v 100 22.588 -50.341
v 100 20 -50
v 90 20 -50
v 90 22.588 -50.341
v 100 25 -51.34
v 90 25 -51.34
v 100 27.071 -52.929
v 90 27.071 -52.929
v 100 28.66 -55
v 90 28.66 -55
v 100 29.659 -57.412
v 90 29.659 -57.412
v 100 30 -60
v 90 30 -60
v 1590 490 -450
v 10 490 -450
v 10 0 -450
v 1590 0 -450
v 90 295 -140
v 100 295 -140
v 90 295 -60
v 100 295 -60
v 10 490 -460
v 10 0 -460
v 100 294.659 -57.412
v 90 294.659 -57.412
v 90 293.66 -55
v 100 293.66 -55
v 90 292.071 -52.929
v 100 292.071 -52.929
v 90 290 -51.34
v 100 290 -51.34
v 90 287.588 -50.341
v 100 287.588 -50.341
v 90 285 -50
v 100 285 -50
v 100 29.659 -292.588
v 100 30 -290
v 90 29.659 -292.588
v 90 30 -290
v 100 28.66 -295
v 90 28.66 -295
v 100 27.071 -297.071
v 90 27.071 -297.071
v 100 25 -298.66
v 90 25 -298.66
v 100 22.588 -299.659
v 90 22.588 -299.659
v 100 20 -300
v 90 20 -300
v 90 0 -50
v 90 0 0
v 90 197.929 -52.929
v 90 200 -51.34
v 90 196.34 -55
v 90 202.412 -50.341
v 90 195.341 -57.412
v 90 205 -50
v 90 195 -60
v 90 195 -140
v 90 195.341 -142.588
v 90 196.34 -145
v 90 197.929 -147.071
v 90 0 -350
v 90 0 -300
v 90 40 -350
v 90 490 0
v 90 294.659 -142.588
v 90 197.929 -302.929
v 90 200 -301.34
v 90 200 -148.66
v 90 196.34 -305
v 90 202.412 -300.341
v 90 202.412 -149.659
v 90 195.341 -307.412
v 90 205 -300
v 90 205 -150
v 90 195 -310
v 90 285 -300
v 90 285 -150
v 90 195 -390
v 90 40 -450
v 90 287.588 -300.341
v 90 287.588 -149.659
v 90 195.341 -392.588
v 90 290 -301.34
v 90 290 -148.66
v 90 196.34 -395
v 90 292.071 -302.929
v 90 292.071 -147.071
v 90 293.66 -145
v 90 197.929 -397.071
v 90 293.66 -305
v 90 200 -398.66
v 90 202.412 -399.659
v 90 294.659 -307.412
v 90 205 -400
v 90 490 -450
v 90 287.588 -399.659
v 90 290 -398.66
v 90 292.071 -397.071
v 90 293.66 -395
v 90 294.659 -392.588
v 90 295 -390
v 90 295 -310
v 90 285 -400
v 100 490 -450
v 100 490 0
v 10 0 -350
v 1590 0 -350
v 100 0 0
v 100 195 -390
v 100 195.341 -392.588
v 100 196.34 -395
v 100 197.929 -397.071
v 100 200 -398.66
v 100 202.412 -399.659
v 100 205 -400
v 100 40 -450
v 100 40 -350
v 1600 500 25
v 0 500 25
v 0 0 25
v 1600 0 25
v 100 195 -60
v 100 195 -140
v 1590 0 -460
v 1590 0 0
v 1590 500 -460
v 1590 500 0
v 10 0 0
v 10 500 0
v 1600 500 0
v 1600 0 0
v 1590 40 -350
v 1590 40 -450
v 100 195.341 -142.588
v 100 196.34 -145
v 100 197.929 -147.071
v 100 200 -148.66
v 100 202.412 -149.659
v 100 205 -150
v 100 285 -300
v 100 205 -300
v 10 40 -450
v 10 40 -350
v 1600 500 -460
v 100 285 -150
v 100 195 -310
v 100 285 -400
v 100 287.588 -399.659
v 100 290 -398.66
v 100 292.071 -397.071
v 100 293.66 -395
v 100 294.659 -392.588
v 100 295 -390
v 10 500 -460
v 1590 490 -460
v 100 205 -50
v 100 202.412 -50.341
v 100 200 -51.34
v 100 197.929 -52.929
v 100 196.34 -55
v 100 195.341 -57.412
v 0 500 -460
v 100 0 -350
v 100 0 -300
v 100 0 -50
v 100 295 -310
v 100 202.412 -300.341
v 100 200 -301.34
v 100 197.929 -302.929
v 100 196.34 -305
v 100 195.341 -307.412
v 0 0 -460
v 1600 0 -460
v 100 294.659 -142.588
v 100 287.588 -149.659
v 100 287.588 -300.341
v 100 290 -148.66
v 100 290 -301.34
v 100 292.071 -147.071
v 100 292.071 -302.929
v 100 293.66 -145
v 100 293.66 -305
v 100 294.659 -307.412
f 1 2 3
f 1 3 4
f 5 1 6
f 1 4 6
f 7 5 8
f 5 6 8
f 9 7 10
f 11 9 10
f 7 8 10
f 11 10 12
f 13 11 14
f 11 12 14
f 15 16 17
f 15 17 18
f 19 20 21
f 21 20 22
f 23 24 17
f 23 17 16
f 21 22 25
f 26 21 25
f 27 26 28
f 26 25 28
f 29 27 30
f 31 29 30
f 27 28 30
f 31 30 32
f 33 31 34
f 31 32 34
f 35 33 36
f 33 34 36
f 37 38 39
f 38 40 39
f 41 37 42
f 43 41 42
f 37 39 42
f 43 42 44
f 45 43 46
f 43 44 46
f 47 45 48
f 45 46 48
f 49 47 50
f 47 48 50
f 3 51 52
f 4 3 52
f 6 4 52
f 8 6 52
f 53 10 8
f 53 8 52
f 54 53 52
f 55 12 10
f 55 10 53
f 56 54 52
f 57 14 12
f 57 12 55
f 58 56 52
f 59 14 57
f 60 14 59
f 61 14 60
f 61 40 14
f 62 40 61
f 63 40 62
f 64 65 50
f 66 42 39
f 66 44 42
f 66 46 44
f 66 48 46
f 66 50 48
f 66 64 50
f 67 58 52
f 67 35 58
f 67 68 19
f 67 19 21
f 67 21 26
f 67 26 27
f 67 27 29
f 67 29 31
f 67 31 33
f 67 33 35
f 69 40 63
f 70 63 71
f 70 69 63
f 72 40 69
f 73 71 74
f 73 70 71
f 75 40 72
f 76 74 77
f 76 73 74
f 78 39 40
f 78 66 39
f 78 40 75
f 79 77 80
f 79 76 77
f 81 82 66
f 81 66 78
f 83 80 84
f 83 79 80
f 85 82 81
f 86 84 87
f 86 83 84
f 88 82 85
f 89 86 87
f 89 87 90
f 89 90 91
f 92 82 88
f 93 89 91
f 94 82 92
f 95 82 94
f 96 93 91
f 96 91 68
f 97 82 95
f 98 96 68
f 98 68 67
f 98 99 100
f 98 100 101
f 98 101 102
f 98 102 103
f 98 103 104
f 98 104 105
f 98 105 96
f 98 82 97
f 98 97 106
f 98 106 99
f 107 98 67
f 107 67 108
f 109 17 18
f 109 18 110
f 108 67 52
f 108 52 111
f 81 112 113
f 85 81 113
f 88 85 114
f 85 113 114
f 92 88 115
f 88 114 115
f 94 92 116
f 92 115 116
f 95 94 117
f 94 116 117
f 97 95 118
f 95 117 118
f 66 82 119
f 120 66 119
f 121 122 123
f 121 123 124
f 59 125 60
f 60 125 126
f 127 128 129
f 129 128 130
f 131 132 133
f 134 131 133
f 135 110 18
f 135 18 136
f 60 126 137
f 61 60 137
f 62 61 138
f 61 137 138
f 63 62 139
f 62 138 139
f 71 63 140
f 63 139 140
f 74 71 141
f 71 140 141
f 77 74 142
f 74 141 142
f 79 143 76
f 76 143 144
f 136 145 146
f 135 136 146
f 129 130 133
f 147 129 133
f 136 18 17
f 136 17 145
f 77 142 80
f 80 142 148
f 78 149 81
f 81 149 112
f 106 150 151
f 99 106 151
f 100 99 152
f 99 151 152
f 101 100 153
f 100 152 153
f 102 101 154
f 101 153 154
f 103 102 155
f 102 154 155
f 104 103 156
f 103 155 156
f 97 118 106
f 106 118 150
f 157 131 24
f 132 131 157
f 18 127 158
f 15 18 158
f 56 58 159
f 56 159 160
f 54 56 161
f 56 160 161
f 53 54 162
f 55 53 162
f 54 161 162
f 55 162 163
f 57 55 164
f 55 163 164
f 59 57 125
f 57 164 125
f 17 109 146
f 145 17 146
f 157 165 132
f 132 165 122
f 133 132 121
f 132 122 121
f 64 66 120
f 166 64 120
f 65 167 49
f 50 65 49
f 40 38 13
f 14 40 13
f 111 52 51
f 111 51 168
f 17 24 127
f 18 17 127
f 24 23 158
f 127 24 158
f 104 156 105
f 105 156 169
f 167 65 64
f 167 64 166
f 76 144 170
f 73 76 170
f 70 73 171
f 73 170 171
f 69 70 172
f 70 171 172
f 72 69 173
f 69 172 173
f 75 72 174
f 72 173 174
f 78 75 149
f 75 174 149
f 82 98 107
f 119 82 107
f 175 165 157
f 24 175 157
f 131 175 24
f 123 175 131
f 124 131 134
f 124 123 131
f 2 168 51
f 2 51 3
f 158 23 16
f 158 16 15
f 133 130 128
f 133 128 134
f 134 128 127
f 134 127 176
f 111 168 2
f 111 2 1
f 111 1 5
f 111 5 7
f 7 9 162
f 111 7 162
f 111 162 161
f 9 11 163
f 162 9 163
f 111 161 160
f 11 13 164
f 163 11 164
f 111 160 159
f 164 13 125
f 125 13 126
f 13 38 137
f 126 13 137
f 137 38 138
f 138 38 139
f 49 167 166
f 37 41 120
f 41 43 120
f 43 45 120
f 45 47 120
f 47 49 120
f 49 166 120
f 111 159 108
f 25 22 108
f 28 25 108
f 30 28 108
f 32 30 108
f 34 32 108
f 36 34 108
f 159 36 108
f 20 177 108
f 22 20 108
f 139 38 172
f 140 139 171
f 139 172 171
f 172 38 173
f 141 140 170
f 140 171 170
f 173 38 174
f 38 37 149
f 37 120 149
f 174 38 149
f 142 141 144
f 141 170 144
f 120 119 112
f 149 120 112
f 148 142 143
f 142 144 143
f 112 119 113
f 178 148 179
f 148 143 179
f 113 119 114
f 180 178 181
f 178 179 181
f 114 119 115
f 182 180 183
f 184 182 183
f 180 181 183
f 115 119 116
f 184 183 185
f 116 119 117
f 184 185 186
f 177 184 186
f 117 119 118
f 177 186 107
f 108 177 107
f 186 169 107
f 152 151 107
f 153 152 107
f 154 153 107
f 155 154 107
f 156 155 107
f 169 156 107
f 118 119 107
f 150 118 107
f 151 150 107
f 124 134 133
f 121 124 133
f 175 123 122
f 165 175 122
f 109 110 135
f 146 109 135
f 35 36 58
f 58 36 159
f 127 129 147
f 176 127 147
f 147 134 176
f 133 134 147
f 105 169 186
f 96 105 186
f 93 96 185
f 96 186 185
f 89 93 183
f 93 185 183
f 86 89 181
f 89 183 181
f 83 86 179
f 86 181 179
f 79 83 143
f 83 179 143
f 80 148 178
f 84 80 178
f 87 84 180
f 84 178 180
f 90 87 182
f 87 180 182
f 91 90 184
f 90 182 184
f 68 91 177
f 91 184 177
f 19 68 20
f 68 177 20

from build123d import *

# Parameters (mm, degrees)
F0_W      = 1600
F0_H      = 500
F1_DEPTH  = 25
F3_W      = 1580
F3_H      = 490
F4_DEPTH  = 10
F5_W      = 10
F5_H      = 500
F6_DEPTH  = 460
F7_W      = 10
F7_H      = 500
F8_DEPTH  = 460
F9_W      = 40
F9_H      = 100
F10_DEPTH = 1580
F11_W     = 10
F11_H     = 450
F12_DEPTH = 450
F13_W     = 10
F13_H     = 350
F14_DEPTH = 40
F16_W     = 30
F16_H     = 250
F17_DEPTH = 100.001
F18_R     = 10
F20_DEPTH = 100.001


with BuildPart() as f1:
    # F0 (on Top) → F1 (new body)
    with BuildSketch(Plane.XY):
        with Locations((800, 250)):
            Rectangle(F0_W, F0_H)
    extrude(amount=F1_DEPTH)

    # F5 (on face) → F6 (join, through all)
    with BuildSketch(Plane.XY):
        with Locations((5, 250)):
            Rectangle(F5_W, F5_H)
    extrude(amount=-F6_DEPTH)


with BuildPart() as f4:
    # F3 (on offset) → F4 (new body)
    with BuildSketch(Plane.XY.offset(-460)):
        with Locations((800, 245)):
            Rectangle(F3_W, F3_H)
    extrude(amount=F4_DEPTH)


with BuildPart() as f8:
    # F7 (on face) → F8 (new body, through all)
    with BuildSketch(Plane.XY):
        with Locations((1595, 250)):
            Rectangle(F7_W, F7_H)
    extrude(amount=-F8_DEPTH)


with BuildPart() as f10:
    # F9 (on face) → F10 (new body, through all)
    with BuildSketch(Plane.YZ.offset(10)):
        with Locations((20, -400)):
            Rectangle(F9_W, F9_H)
    extrude(amount=F10_DEPTH)


with BuildPart() as f12:
    # F11 (on face) → F12 (new body, through all)
    with BuildSketch(Plane.XY.offset(-450)):
        with Locations((95, 265)):
            Rectangle(F11_W, F11_H)
    extrude(amount=F12_DEPTH)


with BuildPart() as f14:
    # F13 (on face) → F14 (new body, through all)
    with BuildSketch(Plane.XZ.offset(-40)):
        with Locations((95, -175)):
            Rectangle(F13_W, F13_H)
    extrude(amount=F14_DEPTH)

    # F15: union F12
    add(f12.part)

    # F16 (on face) → F17 (cut, through all)
    with BuildSketch(Plane.YZ.offset(100)):
        with Locations((15, -175)):
            Rectangle(F16_W, F16_H)
    extrude(amount=-F17_DEPTH, mode=Mode.SUBTRACT)

    # F18
    f18_edges = [f14.edges().sort_by_distance(p)[0] for p in [
        (95, 30, -50),
        (95, 30, -300),
    ]]
    fillet(f18_edges, radius=F18_R)

    # F19 (on face) → F20 (cut, through all)
    with BuildSketch(Plane.YZ.offset(100)):
        with BuildLine():
            Line((285, -50), (205, -50))
            ThreePointArc((205, -50), (197.9289321881, -52.9289321881), (195, -60))
            Line((195, -60), (195, -140))
            ThreePointArc((195, -140), (197.9289321881, -147.0710678119), (205, -150))
            Line((205, -150), (285, -150))
            ThreePointArc((285, -150), (292.0710678119, -147.0710678119), (295, -140))
            Line((295, -140), (295, -60))
            ThreePointArc((295, -60), (292.0710678119, -52.9289321881), (285, -50))
        make_face()
        with BuildLine():
            Line((285, -300), (205, -300))
            ThreePointArc((205, -300), (197.9289321881, -302.9289321881), (195, -310))
            Line((195, -310), (195, -390))
            ThreePointArc((195, -390), (197.9289321881, -397.0710678119), (205, -400))
            Line((205, -400), (285, -400))
            ThreePointArc((285, -400), (292.0710678119, -397.0710678119), (295, -390))
            Line((295, -390), (295, -310))
            ThreePointArc((295, -310), (292.0710678119, -302.9289321881), (285, -300))
        make_face()
    extrude(amount=-F20_DEPTH, mode=Mode.SUBTRACT)


solid = Compound([f1.part, f4.part, f8.part, f10.part, f14.part])
